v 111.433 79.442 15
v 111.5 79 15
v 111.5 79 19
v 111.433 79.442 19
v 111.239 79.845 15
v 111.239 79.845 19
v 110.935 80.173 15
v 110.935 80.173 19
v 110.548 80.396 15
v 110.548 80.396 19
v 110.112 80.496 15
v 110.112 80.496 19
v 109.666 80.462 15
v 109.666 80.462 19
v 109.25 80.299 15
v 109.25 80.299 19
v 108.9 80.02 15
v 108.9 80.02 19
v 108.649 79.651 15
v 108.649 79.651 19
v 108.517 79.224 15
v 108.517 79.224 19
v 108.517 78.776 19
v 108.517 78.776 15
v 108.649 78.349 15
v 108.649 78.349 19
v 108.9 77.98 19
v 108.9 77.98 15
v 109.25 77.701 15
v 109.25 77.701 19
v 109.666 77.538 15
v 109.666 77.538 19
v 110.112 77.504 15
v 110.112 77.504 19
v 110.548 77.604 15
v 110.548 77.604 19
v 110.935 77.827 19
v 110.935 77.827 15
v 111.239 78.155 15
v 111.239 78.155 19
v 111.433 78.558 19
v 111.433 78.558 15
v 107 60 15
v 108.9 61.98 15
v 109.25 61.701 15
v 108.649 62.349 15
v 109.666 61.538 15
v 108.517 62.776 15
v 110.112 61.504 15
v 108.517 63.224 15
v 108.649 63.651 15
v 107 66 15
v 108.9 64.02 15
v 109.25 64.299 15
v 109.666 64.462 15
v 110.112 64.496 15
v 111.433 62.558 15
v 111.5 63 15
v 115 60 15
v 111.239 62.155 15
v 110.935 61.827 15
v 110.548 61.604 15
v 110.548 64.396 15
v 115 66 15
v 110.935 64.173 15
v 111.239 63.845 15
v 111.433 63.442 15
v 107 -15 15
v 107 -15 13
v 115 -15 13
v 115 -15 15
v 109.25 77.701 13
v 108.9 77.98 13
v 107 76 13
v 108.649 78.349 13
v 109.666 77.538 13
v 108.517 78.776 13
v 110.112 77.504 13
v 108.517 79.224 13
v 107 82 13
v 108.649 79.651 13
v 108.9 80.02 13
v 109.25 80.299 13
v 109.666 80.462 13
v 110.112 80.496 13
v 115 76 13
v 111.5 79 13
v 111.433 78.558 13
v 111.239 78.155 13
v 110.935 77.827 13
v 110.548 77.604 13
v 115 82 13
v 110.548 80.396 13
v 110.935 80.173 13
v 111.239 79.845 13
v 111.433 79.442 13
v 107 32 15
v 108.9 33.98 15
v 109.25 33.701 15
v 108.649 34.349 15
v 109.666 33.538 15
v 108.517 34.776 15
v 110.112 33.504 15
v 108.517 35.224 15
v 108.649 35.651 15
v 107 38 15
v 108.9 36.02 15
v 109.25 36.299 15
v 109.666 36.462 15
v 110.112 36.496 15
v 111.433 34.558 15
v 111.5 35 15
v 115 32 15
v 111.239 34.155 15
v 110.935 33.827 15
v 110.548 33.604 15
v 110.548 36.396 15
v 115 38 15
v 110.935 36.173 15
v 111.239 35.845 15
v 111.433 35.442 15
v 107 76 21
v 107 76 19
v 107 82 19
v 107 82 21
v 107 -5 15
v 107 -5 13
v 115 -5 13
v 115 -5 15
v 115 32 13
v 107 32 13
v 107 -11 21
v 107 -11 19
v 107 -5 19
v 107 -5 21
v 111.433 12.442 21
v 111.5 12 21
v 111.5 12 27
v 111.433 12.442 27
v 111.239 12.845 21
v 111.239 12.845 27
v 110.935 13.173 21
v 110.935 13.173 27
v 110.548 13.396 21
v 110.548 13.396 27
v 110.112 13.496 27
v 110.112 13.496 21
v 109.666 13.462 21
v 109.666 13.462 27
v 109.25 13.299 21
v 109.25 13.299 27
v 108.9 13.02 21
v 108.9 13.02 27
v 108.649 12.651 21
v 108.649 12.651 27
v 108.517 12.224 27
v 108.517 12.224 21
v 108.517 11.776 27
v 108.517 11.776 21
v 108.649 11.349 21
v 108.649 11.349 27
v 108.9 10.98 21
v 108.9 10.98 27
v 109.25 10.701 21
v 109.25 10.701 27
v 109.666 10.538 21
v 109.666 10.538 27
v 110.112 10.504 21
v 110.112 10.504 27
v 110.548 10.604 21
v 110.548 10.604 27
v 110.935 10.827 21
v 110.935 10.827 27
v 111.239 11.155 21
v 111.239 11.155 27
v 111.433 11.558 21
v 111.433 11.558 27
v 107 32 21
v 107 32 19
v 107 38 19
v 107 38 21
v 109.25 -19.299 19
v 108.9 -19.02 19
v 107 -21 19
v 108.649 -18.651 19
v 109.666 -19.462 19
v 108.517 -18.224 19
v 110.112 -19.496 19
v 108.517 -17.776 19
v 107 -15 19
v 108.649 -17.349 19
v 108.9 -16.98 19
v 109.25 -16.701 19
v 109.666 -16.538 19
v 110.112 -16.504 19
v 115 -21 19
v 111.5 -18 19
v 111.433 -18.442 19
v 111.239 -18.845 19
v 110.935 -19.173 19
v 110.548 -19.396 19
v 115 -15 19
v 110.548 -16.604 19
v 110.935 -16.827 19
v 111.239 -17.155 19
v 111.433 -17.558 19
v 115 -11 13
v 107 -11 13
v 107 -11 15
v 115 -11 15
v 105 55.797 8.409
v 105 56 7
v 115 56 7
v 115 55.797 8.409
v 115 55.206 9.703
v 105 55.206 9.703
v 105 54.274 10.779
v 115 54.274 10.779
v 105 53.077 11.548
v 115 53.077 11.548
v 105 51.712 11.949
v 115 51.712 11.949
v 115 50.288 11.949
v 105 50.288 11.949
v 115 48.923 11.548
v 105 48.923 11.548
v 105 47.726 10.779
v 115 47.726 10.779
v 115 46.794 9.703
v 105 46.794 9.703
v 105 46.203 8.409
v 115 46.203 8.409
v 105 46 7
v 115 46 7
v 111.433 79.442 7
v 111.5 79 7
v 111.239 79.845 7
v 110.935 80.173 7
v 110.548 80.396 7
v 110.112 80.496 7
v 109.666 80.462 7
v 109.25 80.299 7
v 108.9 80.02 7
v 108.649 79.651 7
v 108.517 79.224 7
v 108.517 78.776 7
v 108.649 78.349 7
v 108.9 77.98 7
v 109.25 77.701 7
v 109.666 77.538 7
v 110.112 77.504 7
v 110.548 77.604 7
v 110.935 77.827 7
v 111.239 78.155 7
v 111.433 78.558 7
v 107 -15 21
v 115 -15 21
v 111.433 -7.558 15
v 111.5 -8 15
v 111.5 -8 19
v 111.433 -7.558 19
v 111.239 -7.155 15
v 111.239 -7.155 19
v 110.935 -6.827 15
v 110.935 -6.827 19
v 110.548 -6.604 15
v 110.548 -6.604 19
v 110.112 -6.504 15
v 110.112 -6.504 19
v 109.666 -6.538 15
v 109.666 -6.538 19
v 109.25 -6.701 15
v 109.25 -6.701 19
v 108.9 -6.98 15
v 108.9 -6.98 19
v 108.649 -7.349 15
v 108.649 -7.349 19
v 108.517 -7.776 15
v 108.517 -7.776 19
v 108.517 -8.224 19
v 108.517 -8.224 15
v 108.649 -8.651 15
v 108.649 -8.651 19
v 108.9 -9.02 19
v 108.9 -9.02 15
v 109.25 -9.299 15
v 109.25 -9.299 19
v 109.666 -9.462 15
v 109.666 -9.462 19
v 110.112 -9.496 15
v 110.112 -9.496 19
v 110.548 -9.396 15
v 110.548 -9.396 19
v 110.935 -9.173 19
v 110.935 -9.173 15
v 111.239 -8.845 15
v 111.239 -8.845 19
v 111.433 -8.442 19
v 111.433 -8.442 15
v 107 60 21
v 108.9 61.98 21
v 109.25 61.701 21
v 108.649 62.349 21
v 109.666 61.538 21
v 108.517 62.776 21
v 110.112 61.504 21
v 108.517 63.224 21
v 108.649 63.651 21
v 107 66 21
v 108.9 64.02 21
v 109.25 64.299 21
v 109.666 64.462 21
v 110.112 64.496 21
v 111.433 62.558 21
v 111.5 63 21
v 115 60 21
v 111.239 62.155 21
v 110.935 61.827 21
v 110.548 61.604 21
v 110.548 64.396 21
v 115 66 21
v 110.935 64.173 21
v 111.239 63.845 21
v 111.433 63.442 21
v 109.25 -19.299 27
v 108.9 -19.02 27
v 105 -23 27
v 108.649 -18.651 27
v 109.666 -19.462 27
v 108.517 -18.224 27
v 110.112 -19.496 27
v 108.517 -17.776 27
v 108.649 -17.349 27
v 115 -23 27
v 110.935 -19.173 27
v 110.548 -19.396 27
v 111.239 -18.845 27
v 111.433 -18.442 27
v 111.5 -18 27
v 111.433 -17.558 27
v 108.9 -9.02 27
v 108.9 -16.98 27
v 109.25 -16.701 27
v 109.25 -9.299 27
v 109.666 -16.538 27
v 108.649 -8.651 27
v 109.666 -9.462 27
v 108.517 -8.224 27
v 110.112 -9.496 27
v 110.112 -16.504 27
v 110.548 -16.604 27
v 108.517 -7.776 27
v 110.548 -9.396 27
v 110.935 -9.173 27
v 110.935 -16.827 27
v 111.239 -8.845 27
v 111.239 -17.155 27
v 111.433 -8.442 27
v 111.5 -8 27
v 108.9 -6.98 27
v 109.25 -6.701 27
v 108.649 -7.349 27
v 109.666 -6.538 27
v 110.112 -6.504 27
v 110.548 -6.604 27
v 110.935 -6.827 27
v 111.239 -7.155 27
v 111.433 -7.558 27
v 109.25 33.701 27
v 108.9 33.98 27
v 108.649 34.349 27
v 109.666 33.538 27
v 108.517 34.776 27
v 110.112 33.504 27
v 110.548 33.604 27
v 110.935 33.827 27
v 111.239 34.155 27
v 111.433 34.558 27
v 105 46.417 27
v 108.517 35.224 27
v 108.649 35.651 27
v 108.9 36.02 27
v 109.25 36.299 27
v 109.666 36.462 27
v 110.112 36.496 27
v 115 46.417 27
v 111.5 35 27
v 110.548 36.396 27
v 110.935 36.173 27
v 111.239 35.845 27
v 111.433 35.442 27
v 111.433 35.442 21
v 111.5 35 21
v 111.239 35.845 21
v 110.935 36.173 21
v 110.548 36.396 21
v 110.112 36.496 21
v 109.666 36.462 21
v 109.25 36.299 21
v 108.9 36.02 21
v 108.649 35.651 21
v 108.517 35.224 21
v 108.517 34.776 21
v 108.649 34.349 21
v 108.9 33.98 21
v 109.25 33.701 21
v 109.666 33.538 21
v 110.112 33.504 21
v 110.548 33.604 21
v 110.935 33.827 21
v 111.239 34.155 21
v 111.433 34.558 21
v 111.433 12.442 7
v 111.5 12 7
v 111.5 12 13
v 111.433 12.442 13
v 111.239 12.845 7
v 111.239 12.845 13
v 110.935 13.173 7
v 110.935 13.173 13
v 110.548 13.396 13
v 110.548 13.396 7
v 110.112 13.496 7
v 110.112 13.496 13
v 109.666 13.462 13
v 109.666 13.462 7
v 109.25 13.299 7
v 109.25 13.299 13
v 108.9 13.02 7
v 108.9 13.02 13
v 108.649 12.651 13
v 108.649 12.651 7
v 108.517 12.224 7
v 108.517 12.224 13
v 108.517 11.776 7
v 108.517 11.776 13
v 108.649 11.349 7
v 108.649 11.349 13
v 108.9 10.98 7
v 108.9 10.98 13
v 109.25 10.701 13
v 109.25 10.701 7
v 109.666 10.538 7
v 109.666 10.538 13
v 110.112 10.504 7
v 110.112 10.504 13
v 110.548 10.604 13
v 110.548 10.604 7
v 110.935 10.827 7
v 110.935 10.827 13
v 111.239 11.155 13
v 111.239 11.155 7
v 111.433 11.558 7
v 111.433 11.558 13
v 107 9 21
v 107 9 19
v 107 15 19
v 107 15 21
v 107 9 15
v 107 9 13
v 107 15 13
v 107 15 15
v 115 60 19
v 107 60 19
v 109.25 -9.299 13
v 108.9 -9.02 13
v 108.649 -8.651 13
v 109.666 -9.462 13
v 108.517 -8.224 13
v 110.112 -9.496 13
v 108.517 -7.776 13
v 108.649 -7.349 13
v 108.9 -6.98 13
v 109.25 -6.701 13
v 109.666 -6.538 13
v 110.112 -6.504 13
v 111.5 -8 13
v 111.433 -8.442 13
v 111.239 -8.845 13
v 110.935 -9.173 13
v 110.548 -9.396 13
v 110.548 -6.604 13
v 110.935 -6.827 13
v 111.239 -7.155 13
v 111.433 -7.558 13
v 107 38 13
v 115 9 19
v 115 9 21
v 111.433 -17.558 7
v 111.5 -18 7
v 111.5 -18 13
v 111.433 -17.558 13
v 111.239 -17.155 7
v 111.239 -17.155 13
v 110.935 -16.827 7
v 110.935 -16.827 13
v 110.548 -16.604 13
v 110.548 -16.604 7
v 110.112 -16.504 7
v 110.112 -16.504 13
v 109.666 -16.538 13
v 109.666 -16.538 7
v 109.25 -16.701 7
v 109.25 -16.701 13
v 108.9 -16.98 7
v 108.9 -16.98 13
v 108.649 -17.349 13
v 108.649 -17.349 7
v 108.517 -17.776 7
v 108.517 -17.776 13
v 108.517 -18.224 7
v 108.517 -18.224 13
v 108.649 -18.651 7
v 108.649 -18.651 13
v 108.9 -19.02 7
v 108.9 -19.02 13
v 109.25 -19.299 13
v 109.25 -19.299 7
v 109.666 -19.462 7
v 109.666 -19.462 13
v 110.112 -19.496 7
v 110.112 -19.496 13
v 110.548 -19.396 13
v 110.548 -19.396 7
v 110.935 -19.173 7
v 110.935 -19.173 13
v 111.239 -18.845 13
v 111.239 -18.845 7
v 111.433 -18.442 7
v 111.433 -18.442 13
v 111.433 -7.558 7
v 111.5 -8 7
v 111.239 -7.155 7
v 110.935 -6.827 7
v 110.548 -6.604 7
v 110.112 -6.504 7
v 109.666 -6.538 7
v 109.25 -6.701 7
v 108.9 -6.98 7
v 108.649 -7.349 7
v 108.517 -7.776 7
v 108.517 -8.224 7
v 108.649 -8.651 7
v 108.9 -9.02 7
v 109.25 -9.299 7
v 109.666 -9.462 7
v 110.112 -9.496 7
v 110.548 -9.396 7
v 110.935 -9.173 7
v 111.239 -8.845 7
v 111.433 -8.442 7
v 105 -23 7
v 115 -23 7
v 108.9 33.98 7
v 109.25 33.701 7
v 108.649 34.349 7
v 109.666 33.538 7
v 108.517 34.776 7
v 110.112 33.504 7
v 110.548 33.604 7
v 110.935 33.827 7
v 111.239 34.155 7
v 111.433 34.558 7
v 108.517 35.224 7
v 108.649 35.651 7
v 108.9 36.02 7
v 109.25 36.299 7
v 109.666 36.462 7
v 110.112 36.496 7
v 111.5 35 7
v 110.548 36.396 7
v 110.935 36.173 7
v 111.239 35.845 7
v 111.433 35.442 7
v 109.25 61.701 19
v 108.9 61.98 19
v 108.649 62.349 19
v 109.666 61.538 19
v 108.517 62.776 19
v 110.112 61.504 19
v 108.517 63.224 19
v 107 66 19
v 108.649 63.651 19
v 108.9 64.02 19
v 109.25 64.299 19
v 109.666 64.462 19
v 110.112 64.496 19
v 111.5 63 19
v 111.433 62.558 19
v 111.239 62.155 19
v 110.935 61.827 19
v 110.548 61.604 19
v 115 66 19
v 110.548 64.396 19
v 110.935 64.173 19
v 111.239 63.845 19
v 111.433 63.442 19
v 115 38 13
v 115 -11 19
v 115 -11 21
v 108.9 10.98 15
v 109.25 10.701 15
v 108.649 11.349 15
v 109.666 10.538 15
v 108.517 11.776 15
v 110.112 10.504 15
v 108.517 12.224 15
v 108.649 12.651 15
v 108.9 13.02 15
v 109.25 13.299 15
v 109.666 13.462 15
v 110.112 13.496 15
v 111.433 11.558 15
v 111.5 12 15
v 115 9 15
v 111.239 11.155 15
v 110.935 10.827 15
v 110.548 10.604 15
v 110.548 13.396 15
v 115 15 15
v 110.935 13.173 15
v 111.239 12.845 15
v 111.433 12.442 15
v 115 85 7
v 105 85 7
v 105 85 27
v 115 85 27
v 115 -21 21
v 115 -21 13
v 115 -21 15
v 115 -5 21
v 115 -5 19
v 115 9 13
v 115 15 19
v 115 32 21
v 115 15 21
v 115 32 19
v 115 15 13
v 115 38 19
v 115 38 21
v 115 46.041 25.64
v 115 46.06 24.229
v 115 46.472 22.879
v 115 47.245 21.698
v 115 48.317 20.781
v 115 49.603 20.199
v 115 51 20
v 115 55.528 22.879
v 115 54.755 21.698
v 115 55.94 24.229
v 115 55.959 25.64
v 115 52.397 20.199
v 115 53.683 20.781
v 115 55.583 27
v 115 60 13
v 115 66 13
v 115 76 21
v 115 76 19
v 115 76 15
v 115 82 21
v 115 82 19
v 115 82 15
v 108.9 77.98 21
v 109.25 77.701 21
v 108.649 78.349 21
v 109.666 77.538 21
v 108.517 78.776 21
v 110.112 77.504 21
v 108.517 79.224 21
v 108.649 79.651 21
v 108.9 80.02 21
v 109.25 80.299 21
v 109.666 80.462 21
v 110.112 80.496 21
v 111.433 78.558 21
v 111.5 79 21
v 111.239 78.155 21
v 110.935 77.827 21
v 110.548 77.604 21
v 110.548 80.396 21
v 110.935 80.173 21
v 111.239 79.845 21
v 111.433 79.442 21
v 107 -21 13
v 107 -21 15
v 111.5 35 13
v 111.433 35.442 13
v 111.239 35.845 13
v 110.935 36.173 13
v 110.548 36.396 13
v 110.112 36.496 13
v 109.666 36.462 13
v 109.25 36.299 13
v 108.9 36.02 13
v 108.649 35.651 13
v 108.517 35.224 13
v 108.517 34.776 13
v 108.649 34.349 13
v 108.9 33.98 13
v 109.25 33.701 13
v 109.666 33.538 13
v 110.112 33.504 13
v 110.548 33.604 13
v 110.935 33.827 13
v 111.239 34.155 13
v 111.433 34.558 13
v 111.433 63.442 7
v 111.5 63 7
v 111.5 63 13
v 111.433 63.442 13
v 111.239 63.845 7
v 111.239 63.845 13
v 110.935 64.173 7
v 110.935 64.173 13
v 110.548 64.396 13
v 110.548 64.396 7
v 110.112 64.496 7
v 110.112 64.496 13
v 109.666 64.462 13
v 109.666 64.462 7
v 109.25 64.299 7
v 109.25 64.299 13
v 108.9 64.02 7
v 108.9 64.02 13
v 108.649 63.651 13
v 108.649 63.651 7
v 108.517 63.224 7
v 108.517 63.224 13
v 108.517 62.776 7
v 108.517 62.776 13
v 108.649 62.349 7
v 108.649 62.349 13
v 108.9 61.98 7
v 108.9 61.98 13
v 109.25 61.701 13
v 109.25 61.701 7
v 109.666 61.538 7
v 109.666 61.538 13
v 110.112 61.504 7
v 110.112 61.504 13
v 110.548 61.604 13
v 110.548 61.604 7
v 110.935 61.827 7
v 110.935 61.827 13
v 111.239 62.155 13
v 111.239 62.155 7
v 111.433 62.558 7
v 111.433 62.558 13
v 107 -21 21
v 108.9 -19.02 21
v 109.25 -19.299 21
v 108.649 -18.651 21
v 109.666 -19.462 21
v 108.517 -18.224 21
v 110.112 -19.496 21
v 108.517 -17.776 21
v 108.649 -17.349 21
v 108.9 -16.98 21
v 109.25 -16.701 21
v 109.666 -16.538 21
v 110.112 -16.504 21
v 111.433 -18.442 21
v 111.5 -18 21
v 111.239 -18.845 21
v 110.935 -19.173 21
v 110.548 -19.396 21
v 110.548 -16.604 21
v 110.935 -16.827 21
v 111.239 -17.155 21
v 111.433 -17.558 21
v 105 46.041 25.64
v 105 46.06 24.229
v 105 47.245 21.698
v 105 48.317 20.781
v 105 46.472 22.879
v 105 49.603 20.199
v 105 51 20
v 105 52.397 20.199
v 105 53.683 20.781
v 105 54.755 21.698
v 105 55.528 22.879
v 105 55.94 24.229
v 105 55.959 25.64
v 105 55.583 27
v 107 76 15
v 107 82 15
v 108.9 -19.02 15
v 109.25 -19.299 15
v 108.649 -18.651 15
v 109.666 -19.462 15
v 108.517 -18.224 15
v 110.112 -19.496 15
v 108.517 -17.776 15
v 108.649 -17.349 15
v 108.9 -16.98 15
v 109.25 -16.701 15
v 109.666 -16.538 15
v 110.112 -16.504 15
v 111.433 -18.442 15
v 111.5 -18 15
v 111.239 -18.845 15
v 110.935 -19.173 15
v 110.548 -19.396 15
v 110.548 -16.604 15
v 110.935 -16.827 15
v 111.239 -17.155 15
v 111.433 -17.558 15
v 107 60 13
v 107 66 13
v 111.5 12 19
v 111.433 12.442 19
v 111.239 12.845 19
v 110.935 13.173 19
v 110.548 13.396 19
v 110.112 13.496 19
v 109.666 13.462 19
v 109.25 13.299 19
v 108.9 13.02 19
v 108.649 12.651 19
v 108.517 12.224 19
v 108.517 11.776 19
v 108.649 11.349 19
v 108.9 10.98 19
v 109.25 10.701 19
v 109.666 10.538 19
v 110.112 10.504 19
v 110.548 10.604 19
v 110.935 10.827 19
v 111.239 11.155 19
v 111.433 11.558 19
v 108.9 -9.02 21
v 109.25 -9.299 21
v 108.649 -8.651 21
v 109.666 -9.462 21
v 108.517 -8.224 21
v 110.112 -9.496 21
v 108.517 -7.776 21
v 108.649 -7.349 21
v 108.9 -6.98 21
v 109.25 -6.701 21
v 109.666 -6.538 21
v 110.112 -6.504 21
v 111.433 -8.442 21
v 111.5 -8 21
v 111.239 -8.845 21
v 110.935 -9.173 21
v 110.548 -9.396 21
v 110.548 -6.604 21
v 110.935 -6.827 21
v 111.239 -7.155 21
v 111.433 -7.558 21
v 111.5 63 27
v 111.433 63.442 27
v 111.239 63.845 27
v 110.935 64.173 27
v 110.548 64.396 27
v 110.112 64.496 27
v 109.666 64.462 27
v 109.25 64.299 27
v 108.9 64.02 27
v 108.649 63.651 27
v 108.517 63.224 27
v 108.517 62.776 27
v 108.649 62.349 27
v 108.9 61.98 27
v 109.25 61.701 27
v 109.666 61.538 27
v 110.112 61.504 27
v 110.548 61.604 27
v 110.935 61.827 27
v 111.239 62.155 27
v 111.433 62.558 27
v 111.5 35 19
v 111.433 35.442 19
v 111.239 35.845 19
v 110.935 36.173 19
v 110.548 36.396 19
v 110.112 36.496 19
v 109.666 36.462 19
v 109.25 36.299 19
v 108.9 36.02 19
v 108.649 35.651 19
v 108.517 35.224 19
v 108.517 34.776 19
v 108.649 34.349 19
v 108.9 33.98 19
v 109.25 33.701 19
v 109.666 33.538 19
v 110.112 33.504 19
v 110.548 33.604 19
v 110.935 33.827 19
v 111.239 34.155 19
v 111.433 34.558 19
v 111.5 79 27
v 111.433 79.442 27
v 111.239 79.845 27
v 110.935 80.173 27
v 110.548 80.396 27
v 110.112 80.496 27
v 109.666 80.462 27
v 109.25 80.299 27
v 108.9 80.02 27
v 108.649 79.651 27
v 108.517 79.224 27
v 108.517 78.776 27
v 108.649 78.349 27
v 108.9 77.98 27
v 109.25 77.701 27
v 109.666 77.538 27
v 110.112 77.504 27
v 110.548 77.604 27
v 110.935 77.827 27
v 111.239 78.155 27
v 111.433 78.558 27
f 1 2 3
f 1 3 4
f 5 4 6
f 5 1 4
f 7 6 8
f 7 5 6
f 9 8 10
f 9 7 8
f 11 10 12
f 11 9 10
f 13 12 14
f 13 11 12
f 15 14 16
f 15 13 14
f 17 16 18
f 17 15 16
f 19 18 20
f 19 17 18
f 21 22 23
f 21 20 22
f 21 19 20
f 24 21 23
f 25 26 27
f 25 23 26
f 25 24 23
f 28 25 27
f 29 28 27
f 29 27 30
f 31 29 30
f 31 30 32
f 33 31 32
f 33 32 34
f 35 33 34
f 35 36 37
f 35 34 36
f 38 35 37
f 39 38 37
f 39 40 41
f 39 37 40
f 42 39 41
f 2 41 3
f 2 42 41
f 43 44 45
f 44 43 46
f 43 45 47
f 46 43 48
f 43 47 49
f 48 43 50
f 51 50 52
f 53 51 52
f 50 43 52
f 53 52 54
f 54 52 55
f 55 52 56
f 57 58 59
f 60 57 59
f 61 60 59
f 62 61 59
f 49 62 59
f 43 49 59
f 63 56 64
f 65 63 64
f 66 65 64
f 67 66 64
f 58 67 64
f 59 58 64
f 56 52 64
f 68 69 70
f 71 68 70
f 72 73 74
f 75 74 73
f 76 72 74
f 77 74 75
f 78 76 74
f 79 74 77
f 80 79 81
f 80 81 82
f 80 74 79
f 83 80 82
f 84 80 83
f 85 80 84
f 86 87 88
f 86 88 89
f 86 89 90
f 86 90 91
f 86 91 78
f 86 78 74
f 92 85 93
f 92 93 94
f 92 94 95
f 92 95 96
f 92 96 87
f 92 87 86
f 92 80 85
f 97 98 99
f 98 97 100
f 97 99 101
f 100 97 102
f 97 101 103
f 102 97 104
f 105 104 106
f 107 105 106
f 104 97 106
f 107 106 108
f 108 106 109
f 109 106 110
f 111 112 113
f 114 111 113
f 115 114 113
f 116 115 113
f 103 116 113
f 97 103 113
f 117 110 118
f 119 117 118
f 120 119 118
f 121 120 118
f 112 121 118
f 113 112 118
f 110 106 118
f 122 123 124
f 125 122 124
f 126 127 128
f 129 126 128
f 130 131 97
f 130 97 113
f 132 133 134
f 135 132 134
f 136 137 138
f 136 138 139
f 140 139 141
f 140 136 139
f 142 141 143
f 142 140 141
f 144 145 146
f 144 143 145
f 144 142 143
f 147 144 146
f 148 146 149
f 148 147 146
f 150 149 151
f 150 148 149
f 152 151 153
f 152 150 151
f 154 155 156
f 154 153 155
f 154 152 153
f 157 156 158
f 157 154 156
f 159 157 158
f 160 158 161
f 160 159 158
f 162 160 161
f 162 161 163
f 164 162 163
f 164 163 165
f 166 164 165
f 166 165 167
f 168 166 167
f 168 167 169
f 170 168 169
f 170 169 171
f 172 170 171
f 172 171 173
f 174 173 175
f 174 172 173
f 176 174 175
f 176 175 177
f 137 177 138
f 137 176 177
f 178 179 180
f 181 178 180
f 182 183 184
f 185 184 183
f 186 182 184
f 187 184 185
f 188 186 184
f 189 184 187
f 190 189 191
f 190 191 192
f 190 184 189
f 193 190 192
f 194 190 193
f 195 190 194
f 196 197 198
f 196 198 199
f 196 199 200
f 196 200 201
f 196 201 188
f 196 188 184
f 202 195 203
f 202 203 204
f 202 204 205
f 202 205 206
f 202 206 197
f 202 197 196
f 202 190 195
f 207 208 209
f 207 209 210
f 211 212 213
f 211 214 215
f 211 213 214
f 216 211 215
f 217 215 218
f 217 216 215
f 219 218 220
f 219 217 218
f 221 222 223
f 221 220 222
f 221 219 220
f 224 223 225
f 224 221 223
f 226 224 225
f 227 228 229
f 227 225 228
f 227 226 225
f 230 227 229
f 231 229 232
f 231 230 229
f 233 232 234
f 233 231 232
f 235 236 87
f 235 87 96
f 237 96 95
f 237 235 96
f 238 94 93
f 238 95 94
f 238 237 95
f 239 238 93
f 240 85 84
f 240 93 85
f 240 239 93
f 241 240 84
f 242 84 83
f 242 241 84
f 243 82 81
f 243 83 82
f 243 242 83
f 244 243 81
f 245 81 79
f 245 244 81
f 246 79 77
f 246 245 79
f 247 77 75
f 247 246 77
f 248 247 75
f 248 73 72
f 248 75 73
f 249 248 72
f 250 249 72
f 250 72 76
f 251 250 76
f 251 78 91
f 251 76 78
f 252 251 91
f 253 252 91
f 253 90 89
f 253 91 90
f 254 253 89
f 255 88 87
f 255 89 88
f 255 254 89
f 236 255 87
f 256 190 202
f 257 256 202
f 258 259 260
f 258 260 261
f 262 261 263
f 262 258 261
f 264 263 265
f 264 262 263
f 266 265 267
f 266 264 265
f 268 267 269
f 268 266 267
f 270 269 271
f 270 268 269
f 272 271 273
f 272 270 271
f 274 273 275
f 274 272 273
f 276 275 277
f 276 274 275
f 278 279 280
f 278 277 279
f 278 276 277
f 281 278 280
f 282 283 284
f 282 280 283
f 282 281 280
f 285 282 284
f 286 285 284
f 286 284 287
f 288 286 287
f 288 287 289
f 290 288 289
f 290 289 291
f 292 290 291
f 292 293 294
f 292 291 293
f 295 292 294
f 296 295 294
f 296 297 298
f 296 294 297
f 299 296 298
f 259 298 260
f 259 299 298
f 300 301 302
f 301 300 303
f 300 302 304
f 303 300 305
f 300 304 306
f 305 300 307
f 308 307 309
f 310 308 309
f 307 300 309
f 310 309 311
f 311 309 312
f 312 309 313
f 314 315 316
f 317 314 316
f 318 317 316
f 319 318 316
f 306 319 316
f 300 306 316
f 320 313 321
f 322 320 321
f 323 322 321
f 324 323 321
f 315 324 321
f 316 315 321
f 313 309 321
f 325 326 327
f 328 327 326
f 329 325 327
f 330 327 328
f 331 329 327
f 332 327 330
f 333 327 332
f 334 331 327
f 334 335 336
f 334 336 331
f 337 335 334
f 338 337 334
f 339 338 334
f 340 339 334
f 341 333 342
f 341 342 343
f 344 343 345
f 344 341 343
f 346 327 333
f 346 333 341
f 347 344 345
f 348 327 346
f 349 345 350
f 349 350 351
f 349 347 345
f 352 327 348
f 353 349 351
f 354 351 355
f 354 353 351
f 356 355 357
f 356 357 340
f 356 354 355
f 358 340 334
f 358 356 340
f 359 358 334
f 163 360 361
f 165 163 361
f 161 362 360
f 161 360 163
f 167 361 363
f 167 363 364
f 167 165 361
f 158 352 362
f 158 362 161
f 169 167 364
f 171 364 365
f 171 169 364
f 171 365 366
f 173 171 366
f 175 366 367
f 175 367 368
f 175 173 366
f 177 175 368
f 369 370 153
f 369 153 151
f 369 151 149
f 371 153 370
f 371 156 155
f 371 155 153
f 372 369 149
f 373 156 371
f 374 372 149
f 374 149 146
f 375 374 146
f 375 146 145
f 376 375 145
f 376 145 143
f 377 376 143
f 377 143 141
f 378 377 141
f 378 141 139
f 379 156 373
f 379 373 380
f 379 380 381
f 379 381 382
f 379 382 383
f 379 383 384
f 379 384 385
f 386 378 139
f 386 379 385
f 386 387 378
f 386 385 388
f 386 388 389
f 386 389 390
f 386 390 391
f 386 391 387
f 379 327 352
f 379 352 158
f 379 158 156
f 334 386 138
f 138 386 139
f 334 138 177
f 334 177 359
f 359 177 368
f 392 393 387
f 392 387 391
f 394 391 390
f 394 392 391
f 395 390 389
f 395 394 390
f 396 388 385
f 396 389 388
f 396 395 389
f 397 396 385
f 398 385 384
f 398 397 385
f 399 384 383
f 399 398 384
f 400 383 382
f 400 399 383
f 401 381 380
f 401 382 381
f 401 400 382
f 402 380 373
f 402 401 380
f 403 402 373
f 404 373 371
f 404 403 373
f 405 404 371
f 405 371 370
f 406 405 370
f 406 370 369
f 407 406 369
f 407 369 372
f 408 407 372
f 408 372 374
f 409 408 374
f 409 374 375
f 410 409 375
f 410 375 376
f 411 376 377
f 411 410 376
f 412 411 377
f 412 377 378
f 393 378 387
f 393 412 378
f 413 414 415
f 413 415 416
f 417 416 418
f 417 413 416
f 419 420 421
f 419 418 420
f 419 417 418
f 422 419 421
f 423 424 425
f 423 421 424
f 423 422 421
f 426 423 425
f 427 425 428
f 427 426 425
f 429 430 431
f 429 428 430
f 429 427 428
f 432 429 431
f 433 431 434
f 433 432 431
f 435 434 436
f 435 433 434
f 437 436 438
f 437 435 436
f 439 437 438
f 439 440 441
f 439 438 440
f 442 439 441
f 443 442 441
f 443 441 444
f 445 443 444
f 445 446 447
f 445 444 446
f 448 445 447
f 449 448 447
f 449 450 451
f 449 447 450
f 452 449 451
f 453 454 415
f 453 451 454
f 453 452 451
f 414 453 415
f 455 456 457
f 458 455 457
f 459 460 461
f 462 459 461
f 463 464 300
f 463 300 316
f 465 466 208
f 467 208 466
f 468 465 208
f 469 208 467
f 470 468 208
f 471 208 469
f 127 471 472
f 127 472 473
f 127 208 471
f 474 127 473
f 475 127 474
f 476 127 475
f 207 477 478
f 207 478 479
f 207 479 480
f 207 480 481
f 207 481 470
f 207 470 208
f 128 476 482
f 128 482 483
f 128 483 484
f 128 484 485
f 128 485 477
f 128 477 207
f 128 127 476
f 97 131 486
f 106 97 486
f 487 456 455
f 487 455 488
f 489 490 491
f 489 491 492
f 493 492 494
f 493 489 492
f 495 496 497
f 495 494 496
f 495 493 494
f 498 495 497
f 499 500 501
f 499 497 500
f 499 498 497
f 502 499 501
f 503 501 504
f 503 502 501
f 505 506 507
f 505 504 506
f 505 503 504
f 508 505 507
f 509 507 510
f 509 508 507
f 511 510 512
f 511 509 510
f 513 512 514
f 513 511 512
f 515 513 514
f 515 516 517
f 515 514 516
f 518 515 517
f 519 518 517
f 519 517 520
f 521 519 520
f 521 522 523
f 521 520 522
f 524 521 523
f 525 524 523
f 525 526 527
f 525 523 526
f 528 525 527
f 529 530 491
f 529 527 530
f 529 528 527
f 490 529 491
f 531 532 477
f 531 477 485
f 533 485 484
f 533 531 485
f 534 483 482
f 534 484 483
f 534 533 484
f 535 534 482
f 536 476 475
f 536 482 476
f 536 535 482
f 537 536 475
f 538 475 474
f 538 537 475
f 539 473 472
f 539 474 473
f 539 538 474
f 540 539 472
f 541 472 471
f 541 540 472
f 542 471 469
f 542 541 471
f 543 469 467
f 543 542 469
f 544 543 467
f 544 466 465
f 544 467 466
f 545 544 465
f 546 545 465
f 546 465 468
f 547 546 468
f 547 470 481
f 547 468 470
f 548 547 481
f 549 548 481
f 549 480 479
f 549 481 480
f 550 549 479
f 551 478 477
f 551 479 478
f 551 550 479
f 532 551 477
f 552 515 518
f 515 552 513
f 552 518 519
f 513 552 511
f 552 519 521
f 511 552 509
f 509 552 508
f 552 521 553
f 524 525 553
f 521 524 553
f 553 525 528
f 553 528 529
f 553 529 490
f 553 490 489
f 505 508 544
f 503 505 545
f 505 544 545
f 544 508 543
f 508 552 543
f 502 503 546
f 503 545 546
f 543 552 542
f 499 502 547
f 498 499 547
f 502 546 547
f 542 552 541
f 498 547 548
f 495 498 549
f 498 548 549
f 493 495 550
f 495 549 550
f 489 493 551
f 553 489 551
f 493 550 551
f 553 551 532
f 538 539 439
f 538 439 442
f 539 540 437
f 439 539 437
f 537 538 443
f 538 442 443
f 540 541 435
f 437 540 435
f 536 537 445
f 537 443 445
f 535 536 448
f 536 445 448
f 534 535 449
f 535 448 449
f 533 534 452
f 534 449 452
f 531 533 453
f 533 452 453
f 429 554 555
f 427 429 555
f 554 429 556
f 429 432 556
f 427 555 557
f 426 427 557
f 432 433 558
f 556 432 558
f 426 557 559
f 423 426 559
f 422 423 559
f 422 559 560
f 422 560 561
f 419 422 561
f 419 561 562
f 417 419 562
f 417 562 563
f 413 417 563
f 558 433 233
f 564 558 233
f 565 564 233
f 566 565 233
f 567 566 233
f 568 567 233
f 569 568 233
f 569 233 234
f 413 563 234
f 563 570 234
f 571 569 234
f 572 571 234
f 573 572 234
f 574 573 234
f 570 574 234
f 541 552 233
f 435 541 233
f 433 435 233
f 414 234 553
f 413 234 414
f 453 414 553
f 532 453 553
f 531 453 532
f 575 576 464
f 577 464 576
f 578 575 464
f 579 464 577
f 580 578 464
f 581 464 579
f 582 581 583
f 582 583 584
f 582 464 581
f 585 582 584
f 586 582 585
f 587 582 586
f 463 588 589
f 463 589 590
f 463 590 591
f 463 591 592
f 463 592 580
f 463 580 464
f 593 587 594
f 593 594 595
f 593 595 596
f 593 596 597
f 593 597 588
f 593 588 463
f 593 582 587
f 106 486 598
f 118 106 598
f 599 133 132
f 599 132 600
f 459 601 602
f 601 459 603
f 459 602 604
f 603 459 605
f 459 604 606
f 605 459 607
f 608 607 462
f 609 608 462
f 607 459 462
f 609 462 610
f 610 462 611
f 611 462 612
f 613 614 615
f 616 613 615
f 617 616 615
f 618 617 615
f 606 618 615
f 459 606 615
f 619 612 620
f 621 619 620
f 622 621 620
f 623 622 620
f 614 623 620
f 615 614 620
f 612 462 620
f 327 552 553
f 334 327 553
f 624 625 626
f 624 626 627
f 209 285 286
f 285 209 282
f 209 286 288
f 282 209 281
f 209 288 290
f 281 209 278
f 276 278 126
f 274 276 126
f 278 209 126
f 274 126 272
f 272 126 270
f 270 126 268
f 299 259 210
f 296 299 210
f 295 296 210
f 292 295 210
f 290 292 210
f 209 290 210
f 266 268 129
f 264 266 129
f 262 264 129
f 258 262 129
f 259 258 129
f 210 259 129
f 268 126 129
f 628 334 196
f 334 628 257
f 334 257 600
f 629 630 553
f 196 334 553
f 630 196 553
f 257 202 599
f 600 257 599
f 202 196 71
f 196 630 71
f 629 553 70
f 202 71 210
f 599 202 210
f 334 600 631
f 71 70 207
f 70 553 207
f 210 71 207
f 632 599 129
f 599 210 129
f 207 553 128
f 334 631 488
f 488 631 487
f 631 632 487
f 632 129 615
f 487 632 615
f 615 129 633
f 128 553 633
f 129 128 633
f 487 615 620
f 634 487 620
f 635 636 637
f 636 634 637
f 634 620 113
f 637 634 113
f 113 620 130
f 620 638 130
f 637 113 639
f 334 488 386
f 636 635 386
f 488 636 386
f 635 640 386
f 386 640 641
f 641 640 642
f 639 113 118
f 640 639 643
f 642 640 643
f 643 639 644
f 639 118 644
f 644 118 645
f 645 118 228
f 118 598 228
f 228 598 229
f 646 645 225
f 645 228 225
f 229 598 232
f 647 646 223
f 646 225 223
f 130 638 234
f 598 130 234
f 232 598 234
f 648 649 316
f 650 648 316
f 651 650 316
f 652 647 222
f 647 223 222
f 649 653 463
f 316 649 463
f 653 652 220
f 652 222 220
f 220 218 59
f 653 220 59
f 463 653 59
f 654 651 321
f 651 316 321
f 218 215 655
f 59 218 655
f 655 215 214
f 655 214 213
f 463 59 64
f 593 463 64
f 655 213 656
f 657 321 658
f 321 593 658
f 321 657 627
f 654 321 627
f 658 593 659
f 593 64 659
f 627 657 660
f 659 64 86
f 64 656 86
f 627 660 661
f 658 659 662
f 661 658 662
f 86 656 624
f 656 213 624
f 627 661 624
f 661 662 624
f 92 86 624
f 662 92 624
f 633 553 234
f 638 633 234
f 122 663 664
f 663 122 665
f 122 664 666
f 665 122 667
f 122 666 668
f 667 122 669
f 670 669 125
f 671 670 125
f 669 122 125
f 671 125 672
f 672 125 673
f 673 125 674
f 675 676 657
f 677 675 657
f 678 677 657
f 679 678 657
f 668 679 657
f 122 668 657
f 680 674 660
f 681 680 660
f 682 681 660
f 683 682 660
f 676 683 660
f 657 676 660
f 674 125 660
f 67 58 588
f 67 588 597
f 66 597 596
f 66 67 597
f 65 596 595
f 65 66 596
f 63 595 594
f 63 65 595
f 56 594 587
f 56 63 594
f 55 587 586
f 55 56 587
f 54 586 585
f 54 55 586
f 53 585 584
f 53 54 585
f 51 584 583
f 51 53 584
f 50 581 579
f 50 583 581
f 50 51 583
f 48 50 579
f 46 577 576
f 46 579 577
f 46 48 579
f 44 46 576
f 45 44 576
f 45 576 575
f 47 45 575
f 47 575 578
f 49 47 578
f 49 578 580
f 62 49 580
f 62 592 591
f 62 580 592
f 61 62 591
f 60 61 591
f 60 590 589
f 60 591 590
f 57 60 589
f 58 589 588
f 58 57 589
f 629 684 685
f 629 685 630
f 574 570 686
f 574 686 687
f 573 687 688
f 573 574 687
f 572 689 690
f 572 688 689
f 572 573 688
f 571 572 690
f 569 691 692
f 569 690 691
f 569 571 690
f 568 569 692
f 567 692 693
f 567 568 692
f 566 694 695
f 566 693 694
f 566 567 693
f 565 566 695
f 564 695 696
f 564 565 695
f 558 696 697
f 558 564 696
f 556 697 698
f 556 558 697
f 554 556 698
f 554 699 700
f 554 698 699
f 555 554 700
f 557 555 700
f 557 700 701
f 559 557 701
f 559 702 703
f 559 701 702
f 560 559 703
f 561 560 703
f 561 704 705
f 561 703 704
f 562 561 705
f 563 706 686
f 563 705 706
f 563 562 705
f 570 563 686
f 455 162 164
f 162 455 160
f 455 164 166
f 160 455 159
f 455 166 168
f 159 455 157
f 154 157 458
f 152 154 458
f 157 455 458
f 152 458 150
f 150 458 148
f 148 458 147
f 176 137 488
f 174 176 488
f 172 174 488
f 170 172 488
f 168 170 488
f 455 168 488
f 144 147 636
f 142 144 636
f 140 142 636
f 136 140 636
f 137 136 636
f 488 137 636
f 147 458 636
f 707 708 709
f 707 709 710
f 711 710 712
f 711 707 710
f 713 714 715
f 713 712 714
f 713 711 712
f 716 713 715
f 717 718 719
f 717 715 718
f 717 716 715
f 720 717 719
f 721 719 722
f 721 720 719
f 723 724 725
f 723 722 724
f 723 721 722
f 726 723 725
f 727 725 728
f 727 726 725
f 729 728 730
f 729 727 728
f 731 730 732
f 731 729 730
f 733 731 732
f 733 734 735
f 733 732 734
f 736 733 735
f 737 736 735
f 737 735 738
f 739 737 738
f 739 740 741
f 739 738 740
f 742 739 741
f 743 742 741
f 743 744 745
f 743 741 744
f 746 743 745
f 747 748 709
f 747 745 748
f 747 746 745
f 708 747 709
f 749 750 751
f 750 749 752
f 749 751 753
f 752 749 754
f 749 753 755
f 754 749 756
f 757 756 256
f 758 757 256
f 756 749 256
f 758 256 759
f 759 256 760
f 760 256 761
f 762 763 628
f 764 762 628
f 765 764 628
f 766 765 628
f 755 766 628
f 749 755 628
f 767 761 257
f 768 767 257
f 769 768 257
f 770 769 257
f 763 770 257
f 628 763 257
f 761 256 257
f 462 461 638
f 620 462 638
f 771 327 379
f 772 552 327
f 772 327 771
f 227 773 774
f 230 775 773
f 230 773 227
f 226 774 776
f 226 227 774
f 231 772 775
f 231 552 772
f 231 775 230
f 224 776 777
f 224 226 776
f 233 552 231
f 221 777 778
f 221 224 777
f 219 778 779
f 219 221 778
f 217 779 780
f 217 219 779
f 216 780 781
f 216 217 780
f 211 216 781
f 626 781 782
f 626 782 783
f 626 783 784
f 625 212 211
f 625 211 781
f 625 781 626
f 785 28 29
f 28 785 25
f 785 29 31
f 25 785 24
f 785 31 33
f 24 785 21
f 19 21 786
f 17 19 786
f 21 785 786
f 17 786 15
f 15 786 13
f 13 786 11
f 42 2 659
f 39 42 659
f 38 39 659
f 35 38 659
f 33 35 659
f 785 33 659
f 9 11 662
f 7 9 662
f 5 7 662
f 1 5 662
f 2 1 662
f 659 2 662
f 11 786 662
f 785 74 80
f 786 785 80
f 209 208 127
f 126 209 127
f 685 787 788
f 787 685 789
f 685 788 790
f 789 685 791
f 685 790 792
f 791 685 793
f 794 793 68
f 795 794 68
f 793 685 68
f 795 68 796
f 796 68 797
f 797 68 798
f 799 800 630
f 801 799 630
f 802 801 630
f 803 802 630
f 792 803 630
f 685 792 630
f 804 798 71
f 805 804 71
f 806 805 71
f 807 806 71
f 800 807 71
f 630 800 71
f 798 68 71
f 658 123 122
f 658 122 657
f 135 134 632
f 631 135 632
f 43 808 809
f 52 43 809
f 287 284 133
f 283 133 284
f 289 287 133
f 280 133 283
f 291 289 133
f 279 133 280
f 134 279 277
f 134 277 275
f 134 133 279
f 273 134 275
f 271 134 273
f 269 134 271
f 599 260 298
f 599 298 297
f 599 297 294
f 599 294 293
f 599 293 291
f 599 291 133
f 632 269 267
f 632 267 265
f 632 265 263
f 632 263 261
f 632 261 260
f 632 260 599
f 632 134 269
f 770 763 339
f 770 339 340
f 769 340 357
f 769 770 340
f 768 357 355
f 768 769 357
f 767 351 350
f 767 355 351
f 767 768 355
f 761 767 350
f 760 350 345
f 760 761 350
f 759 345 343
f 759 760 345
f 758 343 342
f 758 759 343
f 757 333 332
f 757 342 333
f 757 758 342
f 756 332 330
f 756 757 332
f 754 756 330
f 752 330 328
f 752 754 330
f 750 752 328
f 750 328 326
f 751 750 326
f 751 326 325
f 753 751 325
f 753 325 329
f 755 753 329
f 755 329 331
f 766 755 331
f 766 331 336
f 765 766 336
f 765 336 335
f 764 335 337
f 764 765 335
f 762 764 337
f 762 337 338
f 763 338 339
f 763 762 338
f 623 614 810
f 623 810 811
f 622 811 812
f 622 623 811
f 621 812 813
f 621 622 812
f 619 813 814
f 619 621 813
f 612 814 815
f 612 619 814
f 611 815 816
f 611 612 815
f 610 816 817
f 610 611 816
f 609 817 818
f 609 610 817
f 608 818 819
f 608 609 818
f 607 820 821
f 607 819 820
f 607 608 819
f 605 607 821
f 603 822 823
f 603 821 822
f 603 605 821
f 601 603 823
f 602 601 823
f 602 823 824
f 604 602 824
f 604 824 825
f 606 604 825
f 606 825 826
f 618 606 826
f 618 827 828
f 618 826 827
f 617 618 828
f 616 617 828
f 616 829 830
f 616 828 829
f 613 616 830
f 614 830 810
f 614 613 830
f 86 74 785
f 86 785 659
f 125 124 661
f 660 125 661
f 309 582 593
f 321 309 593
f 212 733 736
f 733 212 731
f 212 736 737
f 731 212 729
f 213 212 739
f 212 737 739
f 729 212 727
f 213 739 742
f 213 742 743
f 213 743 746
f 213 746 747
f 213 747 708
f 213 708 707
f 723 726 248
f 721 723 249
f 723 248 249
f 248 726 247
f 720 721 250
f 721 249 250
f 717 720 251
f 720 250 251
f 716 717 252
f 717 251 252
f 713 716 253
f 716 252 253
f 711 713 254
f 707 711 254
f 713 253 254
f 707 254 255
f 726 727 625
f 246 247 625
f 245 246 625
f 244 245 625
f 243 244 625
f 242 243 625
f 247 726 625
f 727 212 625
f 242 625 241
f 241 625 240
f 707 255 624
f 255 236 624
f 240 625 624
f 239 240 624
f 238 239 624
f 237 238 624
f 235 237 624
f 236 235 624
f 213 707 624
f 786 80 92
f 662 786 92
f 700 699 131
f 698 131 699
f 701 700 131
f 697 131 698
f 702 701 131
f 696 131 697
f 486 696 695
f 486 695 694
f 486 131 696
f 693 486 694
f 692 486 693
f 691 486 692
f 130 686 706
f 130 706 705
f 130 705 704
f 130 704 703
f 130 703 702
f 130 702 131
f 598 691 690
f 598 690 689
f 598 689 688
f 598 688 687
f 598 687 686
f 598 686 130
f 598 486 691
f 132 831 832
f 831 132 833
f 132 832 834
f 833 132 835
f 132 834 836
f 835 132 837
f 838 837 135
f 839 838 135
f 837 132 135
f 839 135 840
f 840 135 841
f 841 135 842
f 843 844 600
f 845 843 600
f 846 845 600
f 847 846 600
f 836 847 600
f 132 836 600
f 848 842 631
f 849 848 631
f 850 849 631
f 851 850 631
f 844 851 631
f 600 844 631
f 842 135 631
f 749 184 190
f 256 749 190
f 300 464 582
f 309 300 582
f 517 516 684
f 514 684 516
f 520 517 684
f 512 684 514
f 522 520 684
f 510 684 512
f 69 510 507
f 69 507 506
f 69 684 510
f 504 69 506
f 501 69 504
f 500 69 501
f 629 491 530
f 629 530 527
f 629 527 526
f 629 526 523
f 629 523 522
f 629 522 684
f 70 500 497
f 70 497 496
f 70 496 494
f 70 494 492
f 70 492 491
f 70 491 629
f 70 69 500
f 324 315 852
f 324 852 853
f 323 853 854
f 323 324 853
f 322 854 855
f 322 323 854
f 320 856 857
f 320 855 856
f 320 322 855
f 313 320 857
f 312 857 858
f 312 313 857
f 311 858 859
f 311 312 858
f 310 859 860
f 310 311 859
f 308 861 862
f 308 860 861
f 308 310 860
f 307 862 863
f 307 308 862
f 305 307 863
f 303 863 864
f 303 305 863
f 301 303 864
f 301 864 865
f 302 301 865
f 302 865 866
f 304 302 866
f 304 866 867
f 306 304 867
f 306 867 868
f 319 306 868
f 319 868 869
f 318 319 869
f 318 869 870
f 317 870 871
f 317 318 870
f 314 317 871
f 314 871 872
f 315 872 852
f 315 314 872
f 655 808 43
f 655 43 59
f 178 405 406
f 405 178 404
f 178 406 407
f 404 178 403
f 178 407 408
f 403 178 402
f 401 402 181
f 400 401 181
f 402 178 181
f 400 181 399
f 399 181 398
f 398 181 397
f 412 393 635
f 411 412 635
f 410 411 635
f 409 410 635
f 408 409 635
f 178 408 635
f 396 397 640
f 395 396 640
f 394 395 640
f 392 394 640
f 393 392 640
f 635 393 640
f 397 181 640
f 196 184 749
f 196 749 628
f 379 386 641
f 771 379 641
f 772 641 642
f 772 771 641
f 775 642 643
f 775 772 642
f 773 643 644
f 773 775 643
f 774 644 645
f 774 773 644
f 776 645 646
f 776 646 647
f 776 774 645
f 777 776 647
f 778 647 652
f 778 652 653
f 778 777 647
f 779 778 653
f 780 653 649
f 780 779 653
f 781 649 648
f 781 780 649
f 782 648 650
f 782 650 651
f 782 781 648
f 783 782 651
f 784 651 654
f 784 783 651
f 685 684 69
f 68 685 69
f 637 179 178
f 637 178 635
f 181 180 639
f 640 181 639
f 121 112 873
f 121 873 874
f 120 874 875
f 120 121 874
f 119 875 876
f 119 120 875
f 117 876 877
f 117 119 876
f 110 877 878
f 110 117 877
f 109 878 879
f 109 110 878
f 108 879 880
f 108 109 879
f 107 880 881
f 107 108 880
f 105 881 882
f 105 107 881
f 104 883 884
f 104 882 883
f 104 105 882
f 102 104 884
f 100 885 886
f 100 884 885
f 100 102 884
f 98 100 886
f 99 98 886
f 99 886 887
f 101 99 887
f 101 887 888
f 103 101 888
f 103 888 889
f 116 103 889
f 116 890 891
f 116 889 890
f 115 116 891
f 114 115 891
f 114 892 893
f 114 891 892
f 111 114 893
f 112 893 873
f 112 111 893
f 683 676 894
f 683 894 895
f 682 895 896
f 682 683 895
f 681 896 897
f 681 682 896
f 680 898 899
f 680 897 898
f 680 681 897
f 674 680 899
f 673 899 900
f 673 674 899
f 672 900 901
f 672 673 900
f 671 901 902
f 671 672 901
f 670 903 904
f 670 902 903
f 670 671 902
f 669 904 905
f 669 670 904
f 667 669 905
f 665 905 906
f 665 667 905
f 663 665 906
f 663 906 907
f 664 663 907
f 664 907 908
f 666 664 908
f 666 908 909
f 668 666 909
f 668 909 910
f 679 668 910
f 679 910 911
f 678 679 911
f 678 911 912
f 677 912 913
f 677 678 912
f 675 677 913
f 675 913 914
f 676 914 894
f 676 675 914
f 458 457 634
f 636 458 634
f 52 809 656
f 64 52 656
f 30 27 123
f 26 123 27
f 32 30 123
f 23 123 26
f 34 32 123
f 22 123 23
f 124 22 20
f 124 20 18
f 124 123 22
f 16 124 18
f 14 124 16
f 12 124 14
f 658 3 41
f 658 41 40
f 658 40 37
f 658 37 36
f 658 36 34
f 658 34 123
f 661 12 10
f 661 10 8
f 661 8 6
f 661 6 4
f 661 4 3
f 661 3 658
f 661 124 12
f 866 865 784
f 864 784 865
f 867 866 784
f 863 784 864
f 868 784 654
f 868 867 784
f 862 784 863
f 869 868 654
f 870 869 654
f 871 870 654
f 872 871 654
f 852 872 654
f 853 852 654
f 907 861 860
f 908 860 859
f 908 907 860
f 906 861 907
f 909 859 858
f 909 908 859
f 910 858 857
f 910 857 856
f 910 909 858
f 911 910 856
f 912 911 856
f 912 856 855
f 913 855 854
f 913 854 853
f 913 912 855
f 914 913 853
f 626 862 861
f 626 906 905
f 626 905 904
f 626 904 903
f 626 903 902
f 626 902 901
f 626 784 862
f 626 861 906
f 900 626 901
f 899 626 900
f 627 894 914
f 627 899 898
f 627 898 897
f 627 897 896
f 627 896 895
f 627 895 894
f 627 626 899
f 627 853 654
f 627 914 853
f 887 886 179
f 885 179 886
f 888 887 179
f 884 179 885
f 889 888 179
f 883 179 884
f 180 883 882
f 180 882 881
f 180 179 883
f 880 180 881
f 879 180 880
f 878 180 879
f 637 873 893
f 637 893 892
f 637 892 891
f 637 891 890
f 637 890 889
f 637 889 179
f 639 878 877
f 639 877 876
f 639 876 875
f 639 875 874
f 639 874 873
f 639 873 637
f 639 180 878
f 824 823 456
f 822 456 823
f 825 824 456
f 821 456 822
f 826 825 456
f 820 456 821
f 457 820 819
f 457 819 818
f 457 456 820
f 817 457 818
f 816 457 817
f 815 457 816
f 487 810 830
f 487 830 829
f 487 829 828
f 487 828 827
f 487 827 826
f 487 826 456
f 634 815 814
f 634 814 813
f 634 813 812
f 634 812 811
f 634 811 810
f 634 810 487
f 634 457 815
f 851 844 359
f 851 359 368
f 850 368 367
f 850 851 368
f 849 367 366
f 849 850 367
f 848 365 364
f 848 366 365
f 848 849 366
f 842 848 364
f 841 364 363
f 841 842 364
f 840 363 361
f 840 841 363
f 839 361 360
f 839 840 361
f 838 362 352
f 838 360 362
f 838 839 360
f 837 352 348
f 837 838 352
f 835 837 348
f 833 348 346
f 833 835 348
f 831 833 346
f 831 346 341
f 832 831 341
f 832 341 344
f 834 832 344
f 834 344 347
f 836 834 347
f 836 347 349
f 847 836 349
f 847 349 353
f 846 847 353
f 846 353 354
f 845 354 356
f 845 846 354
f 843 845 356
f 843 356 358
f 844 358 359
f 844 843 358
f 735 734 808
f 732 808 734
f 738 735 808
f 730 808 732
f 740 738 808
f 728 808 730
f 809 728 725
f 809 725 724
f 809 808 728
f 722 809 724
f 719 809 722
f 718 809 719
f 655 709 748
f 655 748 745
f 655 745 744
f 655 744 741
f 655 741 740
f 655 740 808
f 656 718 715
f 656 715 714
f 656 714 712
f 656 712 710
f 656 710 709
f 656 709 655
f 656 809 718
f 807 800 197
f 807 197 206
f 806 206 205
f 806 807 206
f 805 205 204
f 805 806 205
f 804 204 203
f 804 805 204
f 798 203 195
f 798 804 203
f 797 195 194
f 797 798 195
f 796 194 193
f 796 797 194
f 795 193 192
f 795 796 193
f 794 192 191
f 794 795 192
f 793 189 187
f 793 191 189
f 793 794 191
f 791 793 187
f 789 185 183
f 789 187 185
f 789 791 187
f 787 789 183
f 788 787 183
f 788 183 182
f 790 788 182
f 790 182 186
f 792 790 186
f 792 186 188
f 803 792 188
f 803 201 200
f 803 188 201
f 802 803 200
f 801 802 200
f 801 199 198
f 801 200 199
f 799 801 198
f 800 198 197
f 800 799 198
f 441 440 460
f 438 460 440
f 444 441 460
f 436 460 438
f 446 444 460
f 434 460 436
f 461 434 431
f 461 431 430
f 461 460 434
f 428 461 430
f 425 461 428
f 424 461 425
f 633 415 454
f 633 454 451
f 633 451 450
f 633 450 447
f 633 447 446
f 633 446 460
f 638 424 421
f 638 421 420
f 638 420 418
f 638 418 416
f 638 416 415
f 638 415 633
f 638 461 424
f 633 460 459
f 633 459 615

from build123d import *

# Parameters (mm, degrees)
BOX202_W          = 16
BOX202_H          = 6
BOX202_DEPTH      = 2
BOX208_W          = 16
BOX208_H          = 6
BOX208_DEPTH      = 2
BOX206_W          = 16
BOX206_H          = 6
BOX206_DEPTH      = 2
BOX204_W          = 16
BOX204_H          = 6
BOX204_DEPTH      = 2
BOX198_W          = 16
BOX198_H          = 6
BOX198_DEPTH      = 2
BOX209_W          = 16
BOX209_H          = 6
BOX209_DEPTH      = 2
BOX205_W          = 16
BOX205_H          = 6
BOX205_DEPTH      = 2
BOX207_W          = 16
BOX207_H          = 6
BOX207_DEPTH      = 2
BOX200_W          = 16
BOX200_H          = 6
BOX200_DEPTH      = 2
BOX212_W          = 16
BOX212_H          = 6
BOX212_DEPTH      = 2
BOX211_W          = 16
BOX211_H          = 6
BOX211_DEPTH      = 2
BOX203_W          = 16
BOX203_H          = 6
BOX203_DEPTH      = 2
CYLINDER480_R     = 1.5
CYLINDER480_DEPTH = 50
CYLINDER467_R     = 1.5
CYLINDER467_DEPTH = 50
CYLINDER483_R     = 1.5
CYLINDER483_DEPTH = 50
CYLINDER486_R     = 1.5
CYLINDER486_DEPTH = 50
CYLINDER488_R     = 1.5
CYLINDER488_DEPTH = 50
CYLINDER482_R     = 1.5
CYLINDER482_DEPTH = 50
CYLINDER476_R     = 5
CYLINDER476_DEPTH = 100
CYLINDER475_R     = 5
CYLINDER475_DEPTH = 100
CYLINDER461_R     = 5
CYLINDER461_DEPTH = 100
CYLINDER477_R     = 5
CYLINDER477_DEPTH = 100
CYLINDER481_R     = 5
CYLINDER481_DEPTH = 100
CYLINDER478_R     = 5
CYLINDER478_DEPTH = 100
CYLINDER479_R     = 5
CYLINDER479_DEPTH = 100
CYLINDER474_R     = 5
CYLINDER474_DEPTH = 100
BOX201_W          = 10
BOX201_H          = 108
BOX201_DEPTH      = 20


with BuildPart() as krychle202:
    # Box202 → Box202 (new body)
    with BuildSketch(Plane(origin=(60, 2, 16), x_dir=(1, 0, 0), z_dir=(0, 0, 1))):
        with Locations((8, 3)):
            Rectangle(BOX202_W, BOX202_H)
    extrude(amount=BOX202_DEPTH)


with BuildPart() as krychle208:
    # Box208 → Box208 (new body)
    with BuildSketch(Plane(origin=(60, -21, 10), x_dir=(1, 0, 0), z_dir=(0, 0, 1))):
        with Locations((8, 3)):
            Rectangle(BOX208_W, BOX208_H)
    extrude(amount=BOX208_DEPTH)


with BuildPart() as krychle206:
    # Box206 → Box206 (new body)
    with BuildSketch(Plane(origin=(60, -21, 16), x_dir=(1, 0, 0), z_dir=(0, 0, 1))):
        with Locations((8, 3)):
            Rectangle(BOX206_W, BOX206_H)
    extrude(amount=BOX206_DEPTH)


with BuildPart() as krychle204:
    # Box204 → Box204 (new body)
    with BuildSketch(Plane(origin=(60, -41, 10), x_dir=(1, 0, 0), z_dir=(0, 0, 1))):
        with Locations((8, 3)):
            Rectangle(BOX204_W, BOX204_H)
    extrude(amount=BOX204_DEPTH)


with BuildPart() as krychle198:
    # Box198 → Box198 (new body)
    with BuildSketch(Plane(origin=(60, -41, 16), x_dir=(1, 0, 0), z_dir=(0, 0, 1))):
        with Locations((8, 3)):
            Rectangle(BOX198_W, BOX198_H)
    extrude(amount=BOX198_DEPTH)


with BuildPart() as krychle209:
    # Box209 → Box209 (new body)
    with BuildSketch(Plane(origin=(60, -51, 10), x_dir=(1, 0, 0), z_dir=(0, 0, 1))):
        with Locations((8, 3)):
            Rectangle(BOX209_W, BOX209_H)
    extrude(amount=BOX209_DEPTH)


with BuildPart() as krychle205:
    # Box205 → Box205 (new body)
    with BuildSketch(Plane(origin=(60, -51, 16), x_dir=(1, 0, 0), z_dir=(0, 0, 1))):
        with Locations((8, 3)):
            Rectangle(BOX205_W, BOX205_H)
    extrude(amount=BOX205_DEPTH)


with BuildPart() as krychle207:
    # Box207 → Box207 (new body)
    with BuildSketch(Plane(origin=(60, 30, 10), x_dir=(1, 0, 0), z_dir=(0, 0, 1))):
        with Locations((8, 3)):
            Rectangle(BOX207_W, BOX207_H)
    extrude(amount=BOX207_DEPTH)


with BuildPart() as krychle200:
    # Box200 → Box200 (new body)
    with BuildSketch(Plane(origin=(60, 46, 10), x_dir=(1, 0, 0), z_dir=(0, 0, 1))):
        with Locations((8, 3)):
            Rectangle(BOX200_W, BOX200_H)
    extrude(amount=BOX200_DEPTH)


with BuildPart() as krychle212:
    # Box212 → Box212 (new body)
    with BuildSketch(Plane(origin=(60, 30, 16), x_dir=(1, 0, 0), z_dir=(0, 0, 1))):
        with Locations((8, 3)):
            Rectangle(BOX212_W, BOX212_H)
    extrude(amount=BOX212_DEPTH)


with BuildPart() as krychle211:
    # Box211 → Box211 (new body)
    with BuildSketch(Plane(origin=(60, 46, 16), x_dir=(1, 0, 0), z_dir=(0, 0, 1))):
        with Locations((8, 3)):
            Rectangle(BOX211_W, BOX211_H)
    extrude(amount=BOX211_DEPTH)


with BuildPart() as compound592:
    # Box203 → Box203 (new body)
    with BuildSketch(Plane(origin=(60, 2, 10), x_dir=(1, 0, 0), z_dir=(0, 0, 1))):
        with Locations((8, 3)):
            Rectangle(BOX203_W, BOX203_H)
    extrude(amount=BOX203_DEPTH)

    # Compound592: union Krychle202, Krychle208, Krychle206, Krychle204, Krychle198, Krychle209, Krychle205, Krychle207, Krychle200, Krychle212, Krychle211
    add(krychle202.part)
    add(krychle208.part)
    add(krychle206.part)
    add(krychle204.part)
    add(krychle198.part)
    add(krychle209.part)
    add(krychle205.part)
    add(krychle207.part)
    add(krychle200.part)
    add(krychle212.part)
    add(krychle211.part)


with BuildPart() as compound592_1:
    # Compound592 placement: moved
    add(compound592.part.moved(Location((39, 24, 3))))


with BuildPart() as v_lec480:
    # Cylinder480 → Cylinder480 (new body)
    with BuildSketch(Plane(origin=(63, -18, -12), x_dir=(1, 0, 0), z_dir=(0, 0, 1))):
        Circle(CYLINDER480_R)
    extrude(amount=CYLINDER480_DEPTH)


with BuildPart() as v_lec467:
    # Cylinder467 → Cylinder467 (new body)
    with BuildSketch(Plane(origin=(63, -38, -12), x_dir=(1, 0, 0), z_dir=(0, 0, 1))):
        Circle(CYLINDER467_R)
    extrude(amount=CYLINDER467_DEPTH)


with BuildPart() as v_lec483:
    # Cylinder483 → Cylinder483 (new body)
    with BuildSketch(Plane(origin=(63, -48, -12), x_dir=(1, 0, 0), z_dir=(0, 0, 1))):
        Circle(CYLINDER483_R)
    extrude(amount=CYLINDER483_DEPTH)


with BuildPart() as v_lec486:
    # Cylinder486 → Cylinder486 (new body)
    with BuildSketch(Plane(origin=(63, 33, -12), x_dir=(1, 0, 0), z_dir=(0, 0, 1))):
        Circle(CYLINDER486_R)
    extrude(amount=CYLINDER486_DEPTH)


with BuildPart() as v_lec488:
    # Cylinder488 → Cylinder488 (new body)
    with BuildSketch(Plane(origin=(63, 49, -12), x_dir=(1, 0, 0), z_dir=(0, 0, 1))):
        Circle(CYLINDER488_R)
    extrude(amount=CYLINDER488_DEPTH)


with BuildPart() as compound593:
    # Cylinder482 → Cylinder482 (new body)
    with BuildSketch(Plane(origin=(63, 5, -12), x_dir=(1, 0, 0), z_dir=(0, 0, 1))):
        Circle(CYLINDER482_R)
    extrude(amount=CYLINDER482_DEPTH)

    # Compound593: union Válec480, Válec467, Válec483, Válec486, Válec488
    add(v_lec480.part)
    add(v_lec467.part)
    add(v_lec483.part)
    add(v_lec486.part)
    add(v_lec488.part)


with BuildPart() as compound593_1:
    # Compound593 placement: moved
    add(compound593.part.moved(Location((39, 24, 0))))


with BuildPart() as v_lec476:
    # Cylinder476 → Cylinder476 (new body)
    with BuildSketch(Plane(origin=(24, -51, 25), x_dir=(0, 0, -1), z_dir=(1, 0, 0))):
        Circle(CYLINDER476_R)
    extrude(amount=CYLINDER476_DEPTH)


with BuildPart() as v_lec475:
    # Cylinder475 → Cylinder475 (new body)
    with BuildSketch(Plane(origin=(24, 36, 34), x_dir=(0, 0, -1), z_dir=(1, 0, 0))):
        Circle(CYLINDER475_R)
    extrude(amount=CYLINDER475_DEPTH)


with BuildPart() as v_lec461:
    # Cylinder461 → Cylinder461 (new body)
    with BuildSketch(Plane(origin=(24, -36, 34), x_dir=(0, 0, -1), z_dir=(1, 0, 0))):
        Circle(CYLINDER461_R)
    extrude(amount=CYLINDER461_DEPTH)


with BuildPart() as v_lec477:
    # Cylinder477 → Cylinder477 (new body)
    with BuildSketch(Plane(origin=(24, -23, -5), x_dir=(0, 0, -1), z_dir=(1, 0, 0))):
        Circle(CYLINDER477_R)
    extrude(amount=CYLINDER477_DEPTH)


with BuildPart() as v_lec481:
    # Cylinder481 → Cylinder481 (new body)
    with BuildSketch(Plane(origin=(24, 51, 7), x_dir=(0, 0, -1), z_dir=(1, 0, 0))):
        Circle(CYLINDER481_R)
    extrude(amount=CYLINDER481_DEPTH)


with BuildPart() as v_lec478:
    # Cylinder478 → Cylinder478 (new body)
    with BuildSketch(Plane(origin=(24, 23, -5), x_dir=(0, 0, -1), z_dir=(1, 0, 0))):
        Circle(CYLINDER478_R)
    extrude(amount=CYLINDER478_DEPTH)


with BuildPart() as v_lec479:
    # Cylinder479 → Cylinder479 (new body)
    with BuildSketch(Plane(origin=(24, -51, 7), x_dir=(0, 0, -1), z_dir=(1, 0, 0))):
        Circle(CYLINDER479_R)
    extrude(amount=CYLINDER479_DEPTH)


with BuildPart() as compound596:
    # Cylinder474 → Cylinder474 (new body)
    with BuildSketch(Plane(origin=(24, 51, 25), x_dir=(0, 0, -1), z_dir=(1, 0, 0))):
        Circle(CYLINDER474_R)
    extrude(amount=CYLINDER474_DEPTH)

    # Compound596: union Válec476, Válec475, Válec461, Válec477, Válec481, Válec478, Válec479
    add(v_lec476.part)
    add(v_lec475.part)
    add(v_lec461.part)
    add(v_lec477.part)
    add(v_lec481.part)
    add(v_lec478.part)
    add(v_lec479.part)


with BuildPart() as compound596_1:
    # Compound596 placement: moved
    add(compound596.part.moved(Location((24, -6, 0))))


with BuildPart() as cut373:
    # Box201 → Box201 (new body)
    with BuildSketch(Plane(origin=(97, -29, 7), x_dir=(1, 0, 0), z_dir=(0, 0, 1))):
        with Locations((5, 54)):
            Rectangle(BOX201_W, BOX201_H)
    extrude(amount=BOX201_DEPTH)

    # Cut370: cut Compound596
    add(compound596_1.part, mode=Mode.SUBTRACT)

    # Cut372: cut Compound593
    add(compound593_1.part, mode=Mode.SUBTRACT)

    # Cut373: cut Compound592
    add(compound592_1.part, mode=Mode.SUBTRACT)


with BuildPart() as cut373_1:
    # Cut373 placement: moved
    add(cut373.part.moved(Location((8, 6, 0))))


solid = cut373_1.part
